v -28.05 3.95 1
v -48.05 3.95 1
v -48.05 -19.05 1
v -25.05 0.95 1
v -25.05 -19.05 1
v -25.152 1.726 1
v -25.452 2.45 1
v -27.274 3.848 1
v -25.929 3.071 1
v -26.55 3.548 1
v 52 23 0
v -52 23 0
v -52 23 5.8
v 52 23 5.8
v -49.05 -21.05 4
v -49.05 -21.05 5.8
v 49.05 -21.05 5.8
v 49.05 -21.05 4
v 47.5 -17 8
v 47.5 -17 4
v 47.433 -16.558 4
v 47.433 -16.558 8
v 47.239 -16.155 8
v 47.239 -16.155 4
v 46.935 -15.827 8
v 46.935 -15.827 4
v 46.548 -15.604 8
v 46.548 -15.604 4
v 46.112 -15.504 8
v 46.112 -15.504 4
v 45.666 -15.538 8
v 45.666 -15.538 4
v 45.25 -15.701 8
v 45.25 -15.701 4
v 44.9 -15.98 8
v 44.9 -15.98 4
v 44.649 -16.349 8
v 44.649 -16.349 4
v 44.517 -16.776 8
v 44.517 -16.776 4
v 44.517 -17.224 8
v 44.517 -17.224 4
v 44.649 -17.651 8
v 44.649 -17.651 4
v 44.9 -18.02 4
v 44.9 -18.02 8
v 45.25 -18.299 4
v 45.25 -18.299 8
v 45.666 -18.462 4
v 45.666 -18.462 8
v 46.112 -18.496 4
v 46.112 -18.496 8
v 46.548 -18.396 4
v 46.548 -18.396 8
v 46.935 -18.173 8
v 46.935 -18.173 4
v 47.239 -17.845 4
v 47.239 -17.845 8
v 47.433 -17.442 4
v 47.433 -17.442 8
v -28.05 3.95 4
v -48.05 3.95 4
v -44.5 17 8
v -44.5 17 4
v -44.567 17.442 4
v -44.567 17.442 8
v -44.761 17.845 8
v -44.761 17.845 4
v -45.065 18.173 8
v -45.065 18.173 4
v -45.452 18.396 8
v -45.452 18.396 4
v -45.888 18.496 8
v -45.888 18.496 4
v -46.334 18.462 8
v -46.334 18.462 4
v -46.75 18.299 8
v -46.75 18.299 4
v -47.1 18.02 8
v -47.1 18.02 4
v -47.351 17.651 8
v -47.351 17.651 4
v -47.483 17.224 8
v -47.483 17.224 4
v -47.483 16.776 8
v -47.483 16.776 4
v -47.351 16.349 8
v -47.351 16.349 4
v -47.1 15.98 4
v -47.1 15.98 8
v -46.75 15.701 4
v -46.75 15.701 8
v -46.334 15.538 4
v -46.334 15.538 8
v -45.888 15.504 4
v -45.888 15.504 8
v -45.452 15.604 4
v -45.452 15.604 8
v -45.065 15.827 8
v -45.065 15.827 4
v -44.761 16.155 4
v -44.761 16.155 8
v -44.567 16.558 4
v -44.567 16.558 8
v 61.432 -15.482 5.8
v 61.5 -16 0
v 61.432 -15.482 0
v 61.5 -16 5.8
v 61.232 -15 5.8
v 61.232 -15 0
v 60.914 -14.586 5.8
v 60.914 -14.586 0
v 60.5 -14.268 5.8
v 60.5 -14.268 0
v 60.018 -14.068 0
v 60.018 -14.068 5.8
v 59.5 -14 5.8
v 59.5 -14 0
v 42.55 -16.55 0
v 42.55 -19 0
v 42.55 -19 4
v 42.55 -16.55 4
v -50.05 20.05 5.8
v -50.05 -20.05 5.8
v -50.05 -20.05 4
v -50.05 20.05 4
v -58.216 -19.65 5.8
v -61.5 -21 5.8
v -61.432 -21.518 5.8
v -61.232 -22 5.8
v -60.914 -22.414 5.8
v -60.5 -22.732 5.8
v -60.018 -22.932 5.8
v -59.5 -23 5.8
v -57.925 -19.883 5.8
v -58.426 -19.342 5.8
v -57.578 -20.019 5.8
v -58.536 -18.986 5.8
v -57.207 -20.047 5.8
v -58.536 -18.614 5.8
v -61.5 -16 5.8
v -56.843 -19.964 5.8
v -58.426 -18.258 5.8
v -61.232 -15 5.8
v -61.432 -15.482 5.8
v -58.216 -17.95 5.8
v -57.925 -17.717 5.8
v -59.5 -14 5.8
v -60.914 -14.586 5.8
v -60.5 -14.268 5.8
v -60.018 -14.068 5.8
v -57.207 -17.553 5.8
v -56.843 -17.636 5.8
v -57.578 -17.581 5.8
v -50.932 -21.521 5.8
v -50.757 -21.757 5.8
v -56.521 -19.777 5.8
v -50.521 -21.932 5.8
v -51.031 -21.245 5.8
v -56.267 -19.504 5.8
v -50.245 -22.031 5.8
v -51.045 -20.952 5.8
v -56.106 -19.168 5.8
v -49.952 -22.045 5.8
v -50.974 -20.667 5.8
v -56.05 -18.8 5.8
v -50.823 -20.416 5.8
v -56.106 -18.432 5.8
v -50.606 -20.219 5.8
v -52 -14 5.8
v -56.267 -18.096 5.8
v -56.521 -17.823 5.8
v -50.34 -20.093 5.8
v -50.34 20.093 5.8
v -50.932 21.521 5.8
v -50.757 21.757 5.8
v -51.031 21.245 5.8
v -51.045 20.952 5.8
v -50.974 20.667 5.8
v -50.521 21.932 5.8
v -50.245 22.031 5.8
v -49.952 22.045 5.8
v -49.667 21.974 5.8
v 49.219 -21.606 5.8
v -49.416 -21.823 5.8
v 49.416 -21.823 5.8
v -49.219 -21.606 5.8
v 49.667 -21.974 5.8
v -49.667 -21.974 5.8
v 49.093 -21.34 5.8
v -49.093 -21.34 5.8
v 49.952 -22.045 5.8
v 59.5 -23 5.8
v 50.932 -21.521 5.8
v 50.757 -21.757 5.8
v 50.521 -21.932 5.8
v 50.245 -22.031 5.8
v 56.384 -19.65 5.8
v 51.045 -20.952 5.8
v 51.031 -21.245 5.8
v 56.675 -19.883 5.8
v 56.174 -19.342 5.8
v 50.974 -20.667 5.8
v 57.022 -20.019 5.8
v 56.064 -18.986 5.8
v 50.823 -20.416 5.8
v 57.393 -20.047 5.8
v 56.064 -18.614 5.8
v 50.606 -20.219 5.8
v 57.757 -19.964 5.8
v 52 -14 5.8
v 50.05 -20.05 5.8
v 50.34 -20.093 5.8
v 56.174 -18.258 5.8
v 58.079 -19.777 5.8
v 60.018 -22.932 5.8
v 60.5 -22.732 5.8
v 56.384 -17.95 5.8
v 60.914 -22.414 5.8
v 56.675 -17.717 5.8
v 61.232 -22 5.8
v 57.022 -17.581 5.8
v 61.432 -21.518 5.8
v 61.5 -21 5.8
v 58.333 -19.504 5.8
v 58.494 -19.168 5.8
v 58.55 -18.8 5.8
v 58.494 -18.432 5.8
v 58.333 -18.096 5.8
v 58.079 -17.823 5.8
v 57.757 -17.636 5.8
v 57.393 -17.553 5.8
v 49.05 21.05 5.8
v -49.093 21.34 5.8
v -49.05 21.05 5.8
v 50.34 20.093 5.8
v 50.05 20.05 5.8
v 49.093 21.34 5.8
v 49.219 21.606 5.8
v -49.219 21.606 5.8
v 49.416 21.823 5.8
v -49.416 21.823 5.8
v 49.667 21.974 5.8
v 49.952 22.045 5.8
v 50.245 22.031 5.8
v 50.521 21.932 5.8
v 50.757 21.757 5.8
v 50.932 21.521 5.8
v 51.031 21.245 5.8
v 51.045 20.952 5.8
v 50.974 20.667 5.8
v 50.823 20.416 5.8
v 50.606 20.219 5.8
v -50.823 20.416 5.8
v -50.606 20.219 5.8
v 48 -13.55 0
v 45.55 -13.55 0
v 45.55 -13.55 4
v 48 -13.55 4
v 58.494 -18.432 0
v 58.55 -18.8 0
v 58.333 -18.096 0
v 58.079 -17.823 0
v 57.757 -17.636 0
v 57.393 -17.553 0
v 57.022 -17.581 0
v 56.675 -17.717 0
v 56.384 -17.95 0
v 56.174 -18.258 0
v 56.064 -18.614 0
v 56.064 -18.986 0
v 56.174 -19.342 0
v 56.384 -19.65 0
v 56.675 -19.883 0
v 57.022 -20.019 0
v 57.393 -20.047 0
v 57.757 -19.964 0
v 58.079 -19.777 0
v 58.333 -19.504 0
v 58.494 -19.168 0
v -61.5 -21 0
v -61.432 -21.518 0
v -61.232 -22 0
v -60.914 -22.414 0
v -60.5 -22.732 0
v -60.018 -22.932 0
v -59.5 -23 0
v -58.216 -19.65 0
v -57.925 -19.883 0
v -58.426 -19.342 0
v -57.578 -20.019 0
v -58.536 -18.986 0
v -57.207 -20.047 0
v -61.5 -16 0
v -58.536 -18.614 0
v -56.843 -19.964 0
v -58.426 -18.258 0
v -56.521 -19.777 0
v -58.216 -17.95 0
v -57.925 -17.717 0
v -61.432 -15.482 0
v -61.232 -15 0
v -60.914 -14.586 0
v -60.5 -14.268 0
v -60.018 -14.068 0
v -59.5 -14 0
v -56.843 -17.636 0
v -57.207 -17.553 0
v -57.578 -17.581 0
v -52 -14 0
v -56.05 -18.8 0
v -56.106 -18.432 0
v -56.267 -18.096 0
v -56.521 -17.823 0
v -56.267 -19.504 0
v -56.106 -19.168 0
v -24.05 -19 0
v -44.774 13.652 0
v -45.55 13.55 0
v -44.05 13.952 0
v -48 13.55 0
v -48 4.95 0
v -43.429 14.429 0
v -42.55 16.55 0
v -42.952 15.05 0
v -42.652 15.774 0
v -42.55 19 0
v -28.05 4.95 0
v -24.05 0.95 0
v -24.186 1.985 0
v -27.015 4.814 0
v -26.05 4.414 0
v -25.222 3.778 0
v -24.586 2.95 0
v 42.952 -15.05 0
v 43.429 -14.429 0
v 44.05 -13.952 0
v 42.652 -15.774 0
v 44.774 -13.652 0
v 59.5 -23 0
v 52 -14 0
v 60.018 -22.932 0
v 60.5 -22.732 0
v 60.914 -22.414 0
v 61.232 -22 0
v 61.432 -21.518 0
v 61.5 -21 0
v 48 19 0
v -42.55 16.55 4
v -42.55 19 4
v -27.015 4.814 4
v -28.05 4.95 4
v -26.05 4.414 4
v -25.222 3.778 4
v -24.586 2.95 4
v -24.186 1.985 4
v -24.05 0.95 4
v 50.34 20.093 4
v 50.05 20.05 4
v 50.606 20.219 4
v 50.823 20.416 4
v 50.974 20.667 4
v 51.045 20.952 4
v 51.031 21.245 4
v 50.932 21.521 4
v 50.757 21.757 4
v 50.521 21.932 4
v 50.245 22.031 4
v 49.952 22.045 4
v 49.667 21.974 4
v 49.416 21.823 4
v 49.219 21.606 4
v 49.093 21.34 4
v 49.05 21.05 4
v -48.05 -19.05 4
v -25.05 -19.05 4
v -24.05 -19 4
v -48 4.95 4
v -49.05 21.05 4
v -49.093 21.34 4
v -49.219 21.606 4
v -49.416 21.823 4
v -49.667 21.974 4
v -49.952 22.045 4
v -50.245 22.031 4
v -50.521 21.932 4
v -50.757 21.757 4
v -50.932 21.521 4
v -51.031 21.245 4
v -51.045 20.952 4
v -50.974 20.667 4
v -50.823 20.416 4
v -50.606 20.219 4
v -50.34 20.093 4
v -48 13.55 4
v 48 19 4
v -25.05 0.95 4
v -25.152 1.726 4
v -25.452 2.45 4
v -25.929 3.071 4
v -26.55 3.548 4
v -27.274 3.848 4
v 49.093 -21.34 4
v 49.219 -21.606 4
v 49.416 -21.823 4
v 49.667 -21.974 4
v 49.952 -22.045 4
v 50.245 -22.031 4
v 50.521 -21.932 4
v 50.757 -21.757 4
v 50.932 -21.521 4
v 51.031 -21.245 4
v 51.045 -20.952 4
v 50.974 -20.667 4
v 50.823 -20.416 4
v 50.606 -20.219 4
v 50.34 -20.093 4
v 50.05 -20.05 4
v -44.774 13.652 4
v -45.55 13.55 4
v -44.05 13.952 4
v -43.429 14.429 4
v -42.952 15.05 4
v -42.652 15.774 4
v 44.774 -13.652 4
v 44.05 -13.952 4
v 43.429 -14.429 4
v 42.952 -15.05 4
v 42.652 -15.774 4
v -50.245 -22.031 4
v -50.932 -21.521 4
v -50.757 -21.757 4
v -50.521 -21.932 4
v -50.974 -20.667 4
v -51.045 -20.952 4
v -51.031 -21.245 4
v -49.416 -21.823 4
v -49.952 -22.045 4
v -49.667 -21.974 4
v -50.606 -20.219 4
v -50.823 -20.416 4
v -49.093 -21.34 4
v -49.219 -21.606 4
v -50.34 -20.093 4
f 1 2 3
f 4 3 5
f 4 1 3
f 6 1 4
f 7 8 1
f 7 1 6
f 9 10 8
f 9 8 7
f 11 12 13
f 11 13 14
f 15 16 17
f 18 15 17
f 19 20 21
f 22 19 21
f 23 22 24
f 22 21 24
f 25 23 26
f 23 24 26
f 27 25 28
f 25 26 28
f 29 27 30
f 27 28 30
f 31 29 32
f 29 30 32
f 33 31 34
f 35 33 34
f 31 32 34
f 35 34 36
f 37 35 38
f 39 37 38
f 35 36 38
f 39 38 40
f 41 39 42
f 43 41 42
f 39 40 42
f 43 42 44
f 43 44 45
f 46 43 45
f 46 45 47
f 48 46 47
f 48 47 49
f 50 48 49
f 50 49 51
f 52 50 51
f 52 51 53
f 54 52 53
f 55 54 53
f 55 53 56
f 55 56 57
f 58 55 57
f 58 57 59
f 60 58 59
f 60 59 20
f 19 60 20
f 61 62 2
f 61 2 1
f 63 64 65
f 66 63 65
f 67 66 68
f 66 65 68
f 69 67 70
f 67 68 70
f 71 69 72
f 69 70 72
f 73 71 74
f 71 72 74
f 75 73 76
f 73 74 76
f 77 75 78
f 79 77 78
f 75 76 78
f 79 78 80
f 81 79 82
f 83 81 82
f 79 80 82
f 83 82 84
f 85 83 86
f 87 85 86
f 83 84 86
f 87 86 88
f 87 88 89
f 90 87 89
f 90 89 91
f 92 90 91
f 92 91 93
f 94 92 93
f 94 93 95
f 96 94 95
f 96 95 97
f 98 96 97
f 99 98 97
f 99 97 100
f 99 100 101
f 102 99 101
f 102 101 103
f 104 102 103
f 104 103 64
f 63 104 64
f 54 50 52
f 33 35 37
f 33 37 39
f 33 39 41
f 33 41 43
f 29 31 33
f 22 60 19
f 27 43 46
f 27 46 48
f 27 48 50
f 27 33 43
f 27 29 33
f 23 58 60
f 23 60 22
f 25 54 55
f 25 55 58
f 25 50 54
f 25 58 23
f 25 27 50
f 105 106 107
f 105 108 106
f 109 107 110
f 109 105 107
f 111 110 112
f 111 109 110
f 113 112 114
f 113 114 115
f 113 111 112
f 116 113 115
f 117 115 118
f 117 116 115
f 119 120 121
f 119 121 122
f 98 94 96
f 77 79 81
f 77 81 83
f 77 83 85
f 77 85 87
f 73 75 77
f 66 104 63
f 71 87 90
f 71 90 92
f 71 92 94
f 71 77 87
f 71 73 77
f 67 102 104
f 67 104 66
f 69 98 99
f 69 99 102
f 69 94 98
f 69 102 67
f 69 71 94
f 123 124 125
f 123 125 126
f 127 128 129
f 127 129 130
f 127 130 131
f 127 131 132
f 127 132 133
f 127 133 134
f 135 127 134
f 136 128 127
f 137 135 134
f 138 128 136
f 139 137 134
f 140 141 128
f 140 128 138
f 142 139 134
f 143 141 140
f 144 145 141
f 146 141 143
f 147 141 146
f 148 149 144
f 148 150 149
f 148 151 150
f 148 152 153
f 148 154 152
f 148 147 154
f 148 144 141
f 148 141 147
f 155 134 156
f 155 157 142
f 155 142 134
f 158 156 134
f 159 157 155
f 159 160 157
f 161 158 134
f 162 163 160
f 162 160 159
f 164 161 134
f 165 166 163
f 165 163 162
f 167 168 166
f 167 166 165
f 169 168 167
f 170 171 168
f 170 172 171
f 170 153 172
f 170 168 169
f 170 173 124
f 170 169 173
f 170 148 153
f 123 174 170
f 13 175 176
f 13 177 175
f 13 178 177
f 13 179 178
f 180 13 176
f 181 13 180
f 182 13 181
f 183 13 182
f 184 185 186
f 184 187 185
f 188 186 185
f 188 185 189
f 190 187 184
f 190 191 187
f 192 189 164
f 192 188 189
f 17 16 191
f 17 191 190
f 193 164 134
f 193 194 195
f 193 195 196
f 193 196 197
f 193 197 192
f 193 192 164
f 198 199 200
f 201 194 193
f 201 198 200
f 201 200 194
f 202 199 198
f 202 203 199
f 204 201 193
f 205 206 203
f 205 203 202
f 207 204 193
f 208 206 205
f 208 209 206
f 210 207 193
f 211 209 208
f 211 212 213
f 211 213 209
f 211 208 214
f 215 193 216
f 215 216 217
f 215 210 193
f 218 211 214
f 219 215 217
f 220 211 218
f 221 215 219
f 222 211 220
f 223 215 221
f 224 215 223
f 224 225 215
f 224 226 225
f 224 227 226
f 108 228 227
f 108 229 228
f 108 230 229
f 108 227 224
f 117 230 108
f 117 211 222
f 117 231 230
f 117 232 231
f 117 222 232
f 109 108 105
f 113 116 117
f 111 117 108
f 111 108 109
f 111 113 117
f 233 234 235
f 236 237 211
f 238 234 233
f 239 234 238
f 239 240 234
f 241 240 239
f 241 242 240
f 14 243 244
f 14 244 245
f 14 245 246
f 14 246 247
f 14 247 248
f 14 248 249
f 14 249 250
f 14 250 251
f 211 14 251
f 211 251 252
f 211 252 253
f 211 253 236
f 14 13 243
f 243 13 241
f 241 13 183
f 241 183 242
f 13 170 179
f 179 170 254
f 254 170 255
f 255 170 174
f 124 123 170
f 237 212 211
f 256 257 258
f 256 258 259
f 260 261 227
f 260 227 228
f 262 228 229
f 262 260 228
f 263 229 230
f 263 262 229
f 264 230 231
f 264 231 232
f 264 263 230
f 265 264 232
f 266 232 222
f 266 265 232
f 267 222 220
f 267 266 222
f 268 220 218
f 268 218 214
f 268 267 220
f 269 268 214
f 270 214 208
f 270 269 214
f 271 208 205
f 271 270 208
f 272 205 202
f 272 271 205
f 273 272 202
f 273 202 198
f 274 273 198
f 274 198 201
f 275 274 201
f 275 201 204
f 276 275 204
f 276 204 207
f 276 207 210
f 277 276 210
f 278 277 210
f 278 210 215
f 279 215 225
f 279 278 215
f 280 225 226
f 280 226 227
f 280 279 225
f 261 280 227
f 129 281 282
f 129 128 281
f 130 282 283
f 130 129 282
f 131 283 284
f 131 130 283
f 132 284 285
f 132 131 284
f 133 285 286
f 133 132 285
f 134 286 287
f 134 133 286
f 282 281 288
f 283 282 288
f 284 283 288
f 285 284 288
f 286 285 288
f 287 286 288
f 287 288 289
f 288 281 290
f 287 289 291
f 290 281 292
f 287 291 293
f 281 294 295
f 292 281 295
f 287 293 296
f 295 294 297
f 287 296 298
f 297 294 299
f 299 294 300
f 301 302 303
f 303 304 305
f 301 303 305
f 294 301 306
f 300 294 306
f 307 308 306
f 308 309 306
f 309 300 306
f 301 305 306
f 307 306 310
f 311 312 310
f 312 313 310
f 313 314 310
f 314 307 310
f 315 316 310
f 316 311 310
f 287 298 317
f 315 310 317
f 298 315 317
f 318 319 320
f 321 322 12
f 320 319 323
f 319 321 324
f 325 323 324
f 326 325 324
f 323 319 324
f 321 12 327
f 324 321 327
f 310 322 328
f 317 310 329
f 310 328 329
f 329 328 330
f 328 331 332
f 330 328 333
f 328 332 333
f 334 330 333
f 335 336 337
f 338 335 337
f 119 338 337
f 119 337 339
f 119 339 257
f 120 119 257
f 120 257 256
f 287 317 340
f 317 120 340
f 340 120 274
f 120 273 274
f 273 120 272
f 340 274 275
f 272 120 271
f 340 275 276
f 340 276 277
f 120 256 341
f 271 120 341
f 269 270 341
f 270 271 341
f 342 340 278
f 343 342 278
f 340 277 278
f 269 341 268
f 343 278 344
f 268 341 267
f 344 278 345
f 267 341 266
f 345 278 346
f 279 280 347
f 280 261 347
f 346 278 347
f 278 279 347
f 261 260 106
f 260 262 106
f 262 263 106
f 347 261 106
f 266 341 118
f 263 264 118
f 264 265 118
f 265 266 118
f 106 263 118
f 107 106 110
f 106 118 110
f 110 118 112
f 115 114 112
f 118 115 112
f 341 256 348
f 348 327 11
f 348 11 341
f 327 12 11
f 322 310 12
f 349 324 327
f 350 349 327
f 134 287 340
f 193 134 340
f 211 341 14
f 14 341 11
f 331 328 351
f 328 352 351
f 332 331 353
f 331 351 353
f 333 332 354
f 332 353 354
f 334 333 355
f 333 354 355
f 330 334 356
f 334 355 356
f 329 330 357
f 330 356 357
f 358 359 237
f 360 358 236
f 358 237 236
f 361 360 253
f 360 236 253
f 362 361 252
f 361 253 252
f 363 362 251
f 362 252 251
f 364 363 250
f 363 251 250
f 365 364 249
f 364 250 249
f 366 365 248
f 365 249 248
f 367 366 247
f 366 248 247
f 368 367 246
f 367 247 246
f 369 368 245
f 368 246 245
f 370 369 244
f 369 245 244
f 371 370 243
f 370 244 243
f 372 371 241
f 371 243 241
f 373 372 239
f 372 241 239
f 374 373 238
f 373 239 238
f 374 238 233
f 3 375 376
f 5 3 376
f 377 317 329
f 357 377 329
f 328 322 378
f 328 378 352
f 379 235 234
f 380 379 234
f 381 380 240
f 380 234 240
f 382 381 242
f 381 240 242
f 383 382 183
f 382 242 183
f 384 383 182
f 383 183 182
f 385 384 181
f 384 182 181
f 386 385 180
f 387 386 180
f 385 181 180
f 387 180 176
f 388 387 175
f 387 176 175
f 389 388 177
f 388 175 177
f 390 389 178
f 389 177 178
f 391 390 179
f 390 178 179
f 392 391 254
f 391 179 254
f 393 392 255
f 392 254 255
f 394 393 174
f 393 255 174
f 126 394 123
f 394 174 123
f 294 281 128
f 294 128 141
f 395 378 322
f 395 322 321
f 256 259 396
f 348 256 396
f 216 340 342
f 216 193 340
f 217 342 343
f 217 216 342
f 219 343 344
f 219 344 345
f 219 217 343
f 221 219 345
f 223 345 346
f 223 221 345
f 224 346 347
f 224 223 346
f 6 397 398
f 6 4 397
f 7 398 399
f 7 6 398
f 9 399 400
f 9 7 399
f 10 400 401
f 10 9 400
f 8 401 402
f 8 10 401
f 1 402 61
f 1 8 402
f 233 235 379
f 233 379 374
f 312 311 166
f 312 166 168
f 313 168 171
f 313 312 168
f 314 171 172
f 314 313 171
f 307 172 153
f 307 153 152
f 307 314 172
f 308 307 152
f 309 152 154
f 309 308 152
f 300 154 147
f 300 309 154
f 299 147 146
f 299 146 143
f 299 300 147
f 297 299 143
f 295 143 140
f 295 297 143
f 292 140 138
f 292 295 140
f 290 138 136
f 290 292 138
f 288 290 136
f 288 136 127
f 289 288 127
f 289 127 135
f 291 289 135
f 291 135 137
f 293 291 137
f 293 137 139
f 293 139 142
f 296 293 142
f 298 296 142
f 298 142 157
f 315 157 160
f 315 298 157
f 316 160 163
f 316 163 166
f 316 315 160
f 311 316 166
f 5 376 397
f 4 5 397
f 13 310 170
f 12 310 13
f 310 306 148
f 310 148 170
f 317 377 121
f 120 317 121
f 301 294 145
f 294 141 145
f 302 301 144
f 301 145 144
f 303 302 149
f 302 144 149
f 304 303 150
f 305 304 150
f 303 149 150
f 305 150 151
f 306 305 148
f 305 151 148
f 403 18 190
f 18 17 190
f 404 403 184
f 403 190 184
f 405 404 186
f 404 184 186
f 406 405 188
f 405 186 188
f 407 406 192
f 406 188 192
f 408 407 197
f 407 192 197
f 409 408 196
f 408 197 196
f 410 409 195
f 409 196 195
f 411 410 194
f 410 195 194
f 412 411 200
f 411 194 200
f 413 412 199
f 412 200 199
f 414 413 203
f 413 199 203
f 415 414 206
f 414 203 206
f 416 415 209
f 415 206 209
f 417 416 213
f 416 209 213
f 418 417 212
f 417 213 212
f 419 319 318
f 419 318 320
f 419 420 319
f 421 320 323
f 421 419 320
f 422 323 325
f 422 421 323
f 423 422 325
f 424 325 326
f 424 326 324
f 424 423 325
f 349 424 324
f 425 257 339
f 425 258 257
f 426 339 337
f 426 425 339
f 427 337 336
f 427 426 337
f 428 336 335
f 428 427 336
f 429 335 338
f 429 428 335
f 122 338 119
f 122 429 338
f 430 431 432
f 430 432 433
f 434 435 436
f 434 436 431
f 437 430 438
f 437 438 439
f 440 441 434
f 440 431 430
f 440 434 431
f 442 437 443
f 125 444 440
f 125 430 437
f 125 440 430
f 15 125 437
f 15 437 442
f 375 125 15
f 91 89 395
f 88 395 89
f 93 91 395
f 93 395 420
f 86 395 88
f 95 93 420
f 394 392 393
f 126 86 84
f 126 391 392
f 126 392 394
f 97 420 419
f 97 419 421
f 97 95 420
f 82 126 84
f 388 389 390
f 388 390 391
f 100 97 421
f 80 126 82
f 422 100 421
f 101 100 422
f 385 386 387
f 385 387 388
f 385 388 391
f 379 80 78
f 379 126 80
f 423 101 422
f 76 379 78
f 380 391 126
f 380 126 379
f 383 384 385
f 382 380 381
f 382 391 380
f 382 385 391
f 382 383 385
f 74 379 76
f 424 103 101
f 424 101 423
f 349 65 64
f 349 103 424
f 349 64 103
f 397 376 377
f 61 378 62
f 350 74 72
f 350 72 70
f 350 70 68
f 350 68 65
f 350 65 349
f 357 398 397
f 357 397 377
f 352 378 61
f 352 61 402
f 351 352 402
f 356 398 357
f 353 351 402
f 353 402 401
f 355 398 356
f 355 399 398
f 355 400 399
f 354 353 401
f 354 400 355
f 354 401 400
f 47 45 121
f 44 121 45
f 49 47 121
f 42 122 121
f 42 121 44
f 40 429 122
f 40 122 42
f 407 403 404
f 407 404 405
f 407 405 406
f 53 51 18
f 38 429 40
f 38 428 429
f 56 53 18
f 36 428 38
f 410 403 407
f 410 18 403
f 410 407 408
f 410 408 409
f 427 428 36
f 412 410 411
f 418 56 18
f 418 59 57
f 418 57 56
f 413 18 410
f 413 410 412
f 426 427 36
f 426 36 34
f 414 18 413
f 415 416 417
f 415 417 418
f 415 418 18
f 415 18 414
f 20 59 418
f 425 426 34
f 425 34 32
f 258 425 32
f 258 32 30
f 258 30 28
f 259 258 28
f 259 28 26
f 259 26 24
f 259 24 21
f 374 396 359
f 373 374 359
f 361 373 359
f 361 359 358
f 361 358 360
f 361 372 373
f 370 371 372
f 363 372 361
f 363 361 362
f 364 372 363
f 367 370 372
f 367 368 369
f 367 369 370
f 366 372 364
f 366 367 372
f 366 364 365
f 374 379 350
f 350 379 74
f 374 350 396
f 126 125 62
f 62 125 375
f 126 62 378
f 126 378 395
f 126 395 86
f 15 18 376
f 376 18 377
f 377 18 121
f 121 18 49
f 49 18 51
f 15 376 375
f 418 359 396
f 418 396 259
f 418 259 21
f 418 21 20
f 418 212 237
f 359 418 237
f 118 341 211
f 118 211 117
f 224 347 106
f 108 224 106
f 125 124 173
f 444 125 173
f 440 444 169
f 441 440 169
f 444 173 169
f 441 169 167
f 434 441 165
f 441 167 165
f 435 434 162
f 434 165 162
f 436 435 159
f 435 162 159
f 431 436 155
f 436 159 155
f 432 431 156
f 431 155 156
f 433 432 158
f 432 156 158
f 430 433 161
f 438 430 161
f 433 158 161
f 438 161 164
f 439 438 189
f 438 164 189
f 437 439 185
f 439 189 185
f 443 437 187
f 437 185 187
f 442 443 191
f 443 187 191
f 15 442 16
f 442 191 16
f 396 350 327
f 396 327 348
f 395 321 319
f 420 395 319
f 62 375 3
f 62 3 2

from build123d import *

# Parameters (mm, degrees)
F0_W      = 104
F0_H      = 46
F1_DEPTH  = 5.8
F2_W      = 123
F2_H      = 9
F3_DEPTH  = 5.8
F4_R      = 1.25
F5_DEPTH  = 5.8
F6_R      = 1.25
F7_DEPTH  = 5.8
F8_W      = 100.1
F8_H      = 42.1
F9_DEPTH  = 1.8
F10_W     = 96
F10_H     = 38
F11_DEPTH = 4
F12_W     = 7.5
F12_H     = 7.5
F13_DEPTH = 4
F14_W     = 7.5
F14_H     = 7.5
F15_DEPTH = 4
F16_R     = 1.5
F17_DEPTH = 8
F18_R     = 1.5
F19_DEPTH = 8
F20_W     = 26
F20_H     = 26
F21_DEPTH = 4
F22_W     = 23
F22_H     = 23
F23_DEPTH = 3
F24_R     = 3
F25_R     = 4
F26_R     = 3
F27_R     = 3
F28_R     = 2
F29_R     = 1
F30_DEPTH = 1.8
F31_R     = 1
F32_DEPTH = 1.8
F33_R     = 1
F34_DEPTH = 1.8


with BuildPart() as f1:
    # F0 (on Top) → F1 (new body)
    with BuildSketch(Plane.XY):
        Rectangle(F0_W, F0_H)
    extrude(amount=F1_DEPTH)

    # F2 (on Top) → F3 (join)
    with BuildSketch(Plane.XY):
        with Locations((0, -18.5)):
            Rectangle(F2_W, F2_H)
    extrude(amount=F3_DEPTH)

    # F4 (on Top) → F5 (cut)
    with BuildSketch(Plane.XY):
        with Locations((-57.3, -18.8)):
            Circle(F4_R)
    extrude(amount=F5_DEPTH, mode=Mode.SUBTRACT)

    # F6 (on Top) → F7 (cut)
    with BuildSketch(Plane.XY):
        with Locations((57.3, -18.8)):
            Circle(F6_R)
    extrude(amount=F7_DEPTH, mode=Mode.SUBTRACT)

    # F8 (on face) → F9 (cut)
    with BuildSketch(Plane.XY.offset(5.8)):
        Rectangle(F8_W, F8_H)
    extrude(amount=-F9_DEPTH, mode=Mode.SUBTRACT)

    # F10 (on face) → F11 (cut)
    with BuildSketch(Plane.XY.offset(4)):
        Rectangle(F10_W, F10_H)
    extrude(amount=-F11_DEPTH, mode=Mode.SUBTRACT)

    # F12 (on Top) → F13 (join)
    with BuildSketch(Plane.XY):
        with Locations((-46.3, 17.3)):
            Rectangle(F12_W, F12_H)
    extrude(amount=F13_DEPTH)

    # F14 (on Top) → F15 (join)
    with BuildSketch(Plane.XY):
        with Locations((46.3, -17.3)):
            Rectangle(F14_W, F14_H)
    extrude(amount=F15_DEPTH)

    # F16 (on Top) → F17 (join)
    with BuildSketch(Plane.XY):
        with Locations((-46, 17)):
            Circle(F16_R)
    extrude(amount=F17_DEPTH)

    # F18 (on Top) → F19 (join)
    with BuildSketch(Plane.XY):
        with Locations((46, -17)):
            Circle(F18_R)
    extrude(amount=F19_DEPTH)

    # F20 (on Top) → F21 (join)
    with BuildSketch(Plane.XY):
        with Locations((-37.05, -8.05)):
            Rectangle(F20_W, F20_H)
    extrude(amount=F21_DEPTH)

    # F22 (on face) → F23 (cut)
    with BuildSketch(Plane.XY.offset(4)):
        with Locations((-36.55, -7.55)):
            Rectangle(F22_W, F22_H)
    extrude(amount=-F23_DEPTH, mode=Mode.SUBTRACT)

    # F24
    f24_edges = [f1.edges().sort_by_distance(p)[0] for p in [
        (-25.05, 3.95, 2.5),
    ]]
    fillet(f24_edges, radius=F24_R)

    # F25
    f25_edges = [f1.edges().sort_by_distance(p)[0] for p in [
        (-24.05, 4.95, 2),
    ]]
    fillet(f25_edges, radius=F25_R)

    # F26
    f26_edges = [f1.edges().sort_by_distance(p)[0] for p in [
        (-42.55, 13.55, 2),
    ]]
    fillet(f26_edges, radius=F26_R)

    # F27
    f27_edges = [f1.edges().sort_by_distance(p)[0] for p in [
        (42.55, -13.55, 2),
    ]]
    fillet(f27_edges, radius=F27_R)

    # F28
    f28_edges = [f1.edges().sort_by_distance(p)[0] for p in [
        (-61.5, -14, 2.9),
        (-61.5, -23, 2.9),
        (61.5, -23, 2.9),
        (61.5, -14, 2.9),
    ]]
    fillet(f28_edges, radius=F28_R)

    # F29 (on face) → F30 (cut)
    with BuildSketch(Plane.XY.offset(5.8)):
        with Locations((-50.05, 21.05)):
            Circle(F29_R)
    extrude(amount=-F30_DEPTH, mode=Mode.SUBTRACT)

    # F31 (on face) → F32 (cut)
    with BuildSketch(Plane.XY.offset(5.8)):
        with Locations((-50.05, -21.05)):
            Circle(F31_R)
    extrude(amount=-F32_DEPTH, mode=Mode.SUBTRACT)

    # F33 (on face) → F34 (cut)
    with BuildSketch(Plane.XY.offset(5.8)):
        with Locations((50.05, -21.05)):
            Circle(F33_R)
        with Locations((50.05, 21.05)):
            Circle(F33_R)
    extrude(amount=-F34_DEPTH, mode=Mode.SUBTRACT)


solid = f1.part
